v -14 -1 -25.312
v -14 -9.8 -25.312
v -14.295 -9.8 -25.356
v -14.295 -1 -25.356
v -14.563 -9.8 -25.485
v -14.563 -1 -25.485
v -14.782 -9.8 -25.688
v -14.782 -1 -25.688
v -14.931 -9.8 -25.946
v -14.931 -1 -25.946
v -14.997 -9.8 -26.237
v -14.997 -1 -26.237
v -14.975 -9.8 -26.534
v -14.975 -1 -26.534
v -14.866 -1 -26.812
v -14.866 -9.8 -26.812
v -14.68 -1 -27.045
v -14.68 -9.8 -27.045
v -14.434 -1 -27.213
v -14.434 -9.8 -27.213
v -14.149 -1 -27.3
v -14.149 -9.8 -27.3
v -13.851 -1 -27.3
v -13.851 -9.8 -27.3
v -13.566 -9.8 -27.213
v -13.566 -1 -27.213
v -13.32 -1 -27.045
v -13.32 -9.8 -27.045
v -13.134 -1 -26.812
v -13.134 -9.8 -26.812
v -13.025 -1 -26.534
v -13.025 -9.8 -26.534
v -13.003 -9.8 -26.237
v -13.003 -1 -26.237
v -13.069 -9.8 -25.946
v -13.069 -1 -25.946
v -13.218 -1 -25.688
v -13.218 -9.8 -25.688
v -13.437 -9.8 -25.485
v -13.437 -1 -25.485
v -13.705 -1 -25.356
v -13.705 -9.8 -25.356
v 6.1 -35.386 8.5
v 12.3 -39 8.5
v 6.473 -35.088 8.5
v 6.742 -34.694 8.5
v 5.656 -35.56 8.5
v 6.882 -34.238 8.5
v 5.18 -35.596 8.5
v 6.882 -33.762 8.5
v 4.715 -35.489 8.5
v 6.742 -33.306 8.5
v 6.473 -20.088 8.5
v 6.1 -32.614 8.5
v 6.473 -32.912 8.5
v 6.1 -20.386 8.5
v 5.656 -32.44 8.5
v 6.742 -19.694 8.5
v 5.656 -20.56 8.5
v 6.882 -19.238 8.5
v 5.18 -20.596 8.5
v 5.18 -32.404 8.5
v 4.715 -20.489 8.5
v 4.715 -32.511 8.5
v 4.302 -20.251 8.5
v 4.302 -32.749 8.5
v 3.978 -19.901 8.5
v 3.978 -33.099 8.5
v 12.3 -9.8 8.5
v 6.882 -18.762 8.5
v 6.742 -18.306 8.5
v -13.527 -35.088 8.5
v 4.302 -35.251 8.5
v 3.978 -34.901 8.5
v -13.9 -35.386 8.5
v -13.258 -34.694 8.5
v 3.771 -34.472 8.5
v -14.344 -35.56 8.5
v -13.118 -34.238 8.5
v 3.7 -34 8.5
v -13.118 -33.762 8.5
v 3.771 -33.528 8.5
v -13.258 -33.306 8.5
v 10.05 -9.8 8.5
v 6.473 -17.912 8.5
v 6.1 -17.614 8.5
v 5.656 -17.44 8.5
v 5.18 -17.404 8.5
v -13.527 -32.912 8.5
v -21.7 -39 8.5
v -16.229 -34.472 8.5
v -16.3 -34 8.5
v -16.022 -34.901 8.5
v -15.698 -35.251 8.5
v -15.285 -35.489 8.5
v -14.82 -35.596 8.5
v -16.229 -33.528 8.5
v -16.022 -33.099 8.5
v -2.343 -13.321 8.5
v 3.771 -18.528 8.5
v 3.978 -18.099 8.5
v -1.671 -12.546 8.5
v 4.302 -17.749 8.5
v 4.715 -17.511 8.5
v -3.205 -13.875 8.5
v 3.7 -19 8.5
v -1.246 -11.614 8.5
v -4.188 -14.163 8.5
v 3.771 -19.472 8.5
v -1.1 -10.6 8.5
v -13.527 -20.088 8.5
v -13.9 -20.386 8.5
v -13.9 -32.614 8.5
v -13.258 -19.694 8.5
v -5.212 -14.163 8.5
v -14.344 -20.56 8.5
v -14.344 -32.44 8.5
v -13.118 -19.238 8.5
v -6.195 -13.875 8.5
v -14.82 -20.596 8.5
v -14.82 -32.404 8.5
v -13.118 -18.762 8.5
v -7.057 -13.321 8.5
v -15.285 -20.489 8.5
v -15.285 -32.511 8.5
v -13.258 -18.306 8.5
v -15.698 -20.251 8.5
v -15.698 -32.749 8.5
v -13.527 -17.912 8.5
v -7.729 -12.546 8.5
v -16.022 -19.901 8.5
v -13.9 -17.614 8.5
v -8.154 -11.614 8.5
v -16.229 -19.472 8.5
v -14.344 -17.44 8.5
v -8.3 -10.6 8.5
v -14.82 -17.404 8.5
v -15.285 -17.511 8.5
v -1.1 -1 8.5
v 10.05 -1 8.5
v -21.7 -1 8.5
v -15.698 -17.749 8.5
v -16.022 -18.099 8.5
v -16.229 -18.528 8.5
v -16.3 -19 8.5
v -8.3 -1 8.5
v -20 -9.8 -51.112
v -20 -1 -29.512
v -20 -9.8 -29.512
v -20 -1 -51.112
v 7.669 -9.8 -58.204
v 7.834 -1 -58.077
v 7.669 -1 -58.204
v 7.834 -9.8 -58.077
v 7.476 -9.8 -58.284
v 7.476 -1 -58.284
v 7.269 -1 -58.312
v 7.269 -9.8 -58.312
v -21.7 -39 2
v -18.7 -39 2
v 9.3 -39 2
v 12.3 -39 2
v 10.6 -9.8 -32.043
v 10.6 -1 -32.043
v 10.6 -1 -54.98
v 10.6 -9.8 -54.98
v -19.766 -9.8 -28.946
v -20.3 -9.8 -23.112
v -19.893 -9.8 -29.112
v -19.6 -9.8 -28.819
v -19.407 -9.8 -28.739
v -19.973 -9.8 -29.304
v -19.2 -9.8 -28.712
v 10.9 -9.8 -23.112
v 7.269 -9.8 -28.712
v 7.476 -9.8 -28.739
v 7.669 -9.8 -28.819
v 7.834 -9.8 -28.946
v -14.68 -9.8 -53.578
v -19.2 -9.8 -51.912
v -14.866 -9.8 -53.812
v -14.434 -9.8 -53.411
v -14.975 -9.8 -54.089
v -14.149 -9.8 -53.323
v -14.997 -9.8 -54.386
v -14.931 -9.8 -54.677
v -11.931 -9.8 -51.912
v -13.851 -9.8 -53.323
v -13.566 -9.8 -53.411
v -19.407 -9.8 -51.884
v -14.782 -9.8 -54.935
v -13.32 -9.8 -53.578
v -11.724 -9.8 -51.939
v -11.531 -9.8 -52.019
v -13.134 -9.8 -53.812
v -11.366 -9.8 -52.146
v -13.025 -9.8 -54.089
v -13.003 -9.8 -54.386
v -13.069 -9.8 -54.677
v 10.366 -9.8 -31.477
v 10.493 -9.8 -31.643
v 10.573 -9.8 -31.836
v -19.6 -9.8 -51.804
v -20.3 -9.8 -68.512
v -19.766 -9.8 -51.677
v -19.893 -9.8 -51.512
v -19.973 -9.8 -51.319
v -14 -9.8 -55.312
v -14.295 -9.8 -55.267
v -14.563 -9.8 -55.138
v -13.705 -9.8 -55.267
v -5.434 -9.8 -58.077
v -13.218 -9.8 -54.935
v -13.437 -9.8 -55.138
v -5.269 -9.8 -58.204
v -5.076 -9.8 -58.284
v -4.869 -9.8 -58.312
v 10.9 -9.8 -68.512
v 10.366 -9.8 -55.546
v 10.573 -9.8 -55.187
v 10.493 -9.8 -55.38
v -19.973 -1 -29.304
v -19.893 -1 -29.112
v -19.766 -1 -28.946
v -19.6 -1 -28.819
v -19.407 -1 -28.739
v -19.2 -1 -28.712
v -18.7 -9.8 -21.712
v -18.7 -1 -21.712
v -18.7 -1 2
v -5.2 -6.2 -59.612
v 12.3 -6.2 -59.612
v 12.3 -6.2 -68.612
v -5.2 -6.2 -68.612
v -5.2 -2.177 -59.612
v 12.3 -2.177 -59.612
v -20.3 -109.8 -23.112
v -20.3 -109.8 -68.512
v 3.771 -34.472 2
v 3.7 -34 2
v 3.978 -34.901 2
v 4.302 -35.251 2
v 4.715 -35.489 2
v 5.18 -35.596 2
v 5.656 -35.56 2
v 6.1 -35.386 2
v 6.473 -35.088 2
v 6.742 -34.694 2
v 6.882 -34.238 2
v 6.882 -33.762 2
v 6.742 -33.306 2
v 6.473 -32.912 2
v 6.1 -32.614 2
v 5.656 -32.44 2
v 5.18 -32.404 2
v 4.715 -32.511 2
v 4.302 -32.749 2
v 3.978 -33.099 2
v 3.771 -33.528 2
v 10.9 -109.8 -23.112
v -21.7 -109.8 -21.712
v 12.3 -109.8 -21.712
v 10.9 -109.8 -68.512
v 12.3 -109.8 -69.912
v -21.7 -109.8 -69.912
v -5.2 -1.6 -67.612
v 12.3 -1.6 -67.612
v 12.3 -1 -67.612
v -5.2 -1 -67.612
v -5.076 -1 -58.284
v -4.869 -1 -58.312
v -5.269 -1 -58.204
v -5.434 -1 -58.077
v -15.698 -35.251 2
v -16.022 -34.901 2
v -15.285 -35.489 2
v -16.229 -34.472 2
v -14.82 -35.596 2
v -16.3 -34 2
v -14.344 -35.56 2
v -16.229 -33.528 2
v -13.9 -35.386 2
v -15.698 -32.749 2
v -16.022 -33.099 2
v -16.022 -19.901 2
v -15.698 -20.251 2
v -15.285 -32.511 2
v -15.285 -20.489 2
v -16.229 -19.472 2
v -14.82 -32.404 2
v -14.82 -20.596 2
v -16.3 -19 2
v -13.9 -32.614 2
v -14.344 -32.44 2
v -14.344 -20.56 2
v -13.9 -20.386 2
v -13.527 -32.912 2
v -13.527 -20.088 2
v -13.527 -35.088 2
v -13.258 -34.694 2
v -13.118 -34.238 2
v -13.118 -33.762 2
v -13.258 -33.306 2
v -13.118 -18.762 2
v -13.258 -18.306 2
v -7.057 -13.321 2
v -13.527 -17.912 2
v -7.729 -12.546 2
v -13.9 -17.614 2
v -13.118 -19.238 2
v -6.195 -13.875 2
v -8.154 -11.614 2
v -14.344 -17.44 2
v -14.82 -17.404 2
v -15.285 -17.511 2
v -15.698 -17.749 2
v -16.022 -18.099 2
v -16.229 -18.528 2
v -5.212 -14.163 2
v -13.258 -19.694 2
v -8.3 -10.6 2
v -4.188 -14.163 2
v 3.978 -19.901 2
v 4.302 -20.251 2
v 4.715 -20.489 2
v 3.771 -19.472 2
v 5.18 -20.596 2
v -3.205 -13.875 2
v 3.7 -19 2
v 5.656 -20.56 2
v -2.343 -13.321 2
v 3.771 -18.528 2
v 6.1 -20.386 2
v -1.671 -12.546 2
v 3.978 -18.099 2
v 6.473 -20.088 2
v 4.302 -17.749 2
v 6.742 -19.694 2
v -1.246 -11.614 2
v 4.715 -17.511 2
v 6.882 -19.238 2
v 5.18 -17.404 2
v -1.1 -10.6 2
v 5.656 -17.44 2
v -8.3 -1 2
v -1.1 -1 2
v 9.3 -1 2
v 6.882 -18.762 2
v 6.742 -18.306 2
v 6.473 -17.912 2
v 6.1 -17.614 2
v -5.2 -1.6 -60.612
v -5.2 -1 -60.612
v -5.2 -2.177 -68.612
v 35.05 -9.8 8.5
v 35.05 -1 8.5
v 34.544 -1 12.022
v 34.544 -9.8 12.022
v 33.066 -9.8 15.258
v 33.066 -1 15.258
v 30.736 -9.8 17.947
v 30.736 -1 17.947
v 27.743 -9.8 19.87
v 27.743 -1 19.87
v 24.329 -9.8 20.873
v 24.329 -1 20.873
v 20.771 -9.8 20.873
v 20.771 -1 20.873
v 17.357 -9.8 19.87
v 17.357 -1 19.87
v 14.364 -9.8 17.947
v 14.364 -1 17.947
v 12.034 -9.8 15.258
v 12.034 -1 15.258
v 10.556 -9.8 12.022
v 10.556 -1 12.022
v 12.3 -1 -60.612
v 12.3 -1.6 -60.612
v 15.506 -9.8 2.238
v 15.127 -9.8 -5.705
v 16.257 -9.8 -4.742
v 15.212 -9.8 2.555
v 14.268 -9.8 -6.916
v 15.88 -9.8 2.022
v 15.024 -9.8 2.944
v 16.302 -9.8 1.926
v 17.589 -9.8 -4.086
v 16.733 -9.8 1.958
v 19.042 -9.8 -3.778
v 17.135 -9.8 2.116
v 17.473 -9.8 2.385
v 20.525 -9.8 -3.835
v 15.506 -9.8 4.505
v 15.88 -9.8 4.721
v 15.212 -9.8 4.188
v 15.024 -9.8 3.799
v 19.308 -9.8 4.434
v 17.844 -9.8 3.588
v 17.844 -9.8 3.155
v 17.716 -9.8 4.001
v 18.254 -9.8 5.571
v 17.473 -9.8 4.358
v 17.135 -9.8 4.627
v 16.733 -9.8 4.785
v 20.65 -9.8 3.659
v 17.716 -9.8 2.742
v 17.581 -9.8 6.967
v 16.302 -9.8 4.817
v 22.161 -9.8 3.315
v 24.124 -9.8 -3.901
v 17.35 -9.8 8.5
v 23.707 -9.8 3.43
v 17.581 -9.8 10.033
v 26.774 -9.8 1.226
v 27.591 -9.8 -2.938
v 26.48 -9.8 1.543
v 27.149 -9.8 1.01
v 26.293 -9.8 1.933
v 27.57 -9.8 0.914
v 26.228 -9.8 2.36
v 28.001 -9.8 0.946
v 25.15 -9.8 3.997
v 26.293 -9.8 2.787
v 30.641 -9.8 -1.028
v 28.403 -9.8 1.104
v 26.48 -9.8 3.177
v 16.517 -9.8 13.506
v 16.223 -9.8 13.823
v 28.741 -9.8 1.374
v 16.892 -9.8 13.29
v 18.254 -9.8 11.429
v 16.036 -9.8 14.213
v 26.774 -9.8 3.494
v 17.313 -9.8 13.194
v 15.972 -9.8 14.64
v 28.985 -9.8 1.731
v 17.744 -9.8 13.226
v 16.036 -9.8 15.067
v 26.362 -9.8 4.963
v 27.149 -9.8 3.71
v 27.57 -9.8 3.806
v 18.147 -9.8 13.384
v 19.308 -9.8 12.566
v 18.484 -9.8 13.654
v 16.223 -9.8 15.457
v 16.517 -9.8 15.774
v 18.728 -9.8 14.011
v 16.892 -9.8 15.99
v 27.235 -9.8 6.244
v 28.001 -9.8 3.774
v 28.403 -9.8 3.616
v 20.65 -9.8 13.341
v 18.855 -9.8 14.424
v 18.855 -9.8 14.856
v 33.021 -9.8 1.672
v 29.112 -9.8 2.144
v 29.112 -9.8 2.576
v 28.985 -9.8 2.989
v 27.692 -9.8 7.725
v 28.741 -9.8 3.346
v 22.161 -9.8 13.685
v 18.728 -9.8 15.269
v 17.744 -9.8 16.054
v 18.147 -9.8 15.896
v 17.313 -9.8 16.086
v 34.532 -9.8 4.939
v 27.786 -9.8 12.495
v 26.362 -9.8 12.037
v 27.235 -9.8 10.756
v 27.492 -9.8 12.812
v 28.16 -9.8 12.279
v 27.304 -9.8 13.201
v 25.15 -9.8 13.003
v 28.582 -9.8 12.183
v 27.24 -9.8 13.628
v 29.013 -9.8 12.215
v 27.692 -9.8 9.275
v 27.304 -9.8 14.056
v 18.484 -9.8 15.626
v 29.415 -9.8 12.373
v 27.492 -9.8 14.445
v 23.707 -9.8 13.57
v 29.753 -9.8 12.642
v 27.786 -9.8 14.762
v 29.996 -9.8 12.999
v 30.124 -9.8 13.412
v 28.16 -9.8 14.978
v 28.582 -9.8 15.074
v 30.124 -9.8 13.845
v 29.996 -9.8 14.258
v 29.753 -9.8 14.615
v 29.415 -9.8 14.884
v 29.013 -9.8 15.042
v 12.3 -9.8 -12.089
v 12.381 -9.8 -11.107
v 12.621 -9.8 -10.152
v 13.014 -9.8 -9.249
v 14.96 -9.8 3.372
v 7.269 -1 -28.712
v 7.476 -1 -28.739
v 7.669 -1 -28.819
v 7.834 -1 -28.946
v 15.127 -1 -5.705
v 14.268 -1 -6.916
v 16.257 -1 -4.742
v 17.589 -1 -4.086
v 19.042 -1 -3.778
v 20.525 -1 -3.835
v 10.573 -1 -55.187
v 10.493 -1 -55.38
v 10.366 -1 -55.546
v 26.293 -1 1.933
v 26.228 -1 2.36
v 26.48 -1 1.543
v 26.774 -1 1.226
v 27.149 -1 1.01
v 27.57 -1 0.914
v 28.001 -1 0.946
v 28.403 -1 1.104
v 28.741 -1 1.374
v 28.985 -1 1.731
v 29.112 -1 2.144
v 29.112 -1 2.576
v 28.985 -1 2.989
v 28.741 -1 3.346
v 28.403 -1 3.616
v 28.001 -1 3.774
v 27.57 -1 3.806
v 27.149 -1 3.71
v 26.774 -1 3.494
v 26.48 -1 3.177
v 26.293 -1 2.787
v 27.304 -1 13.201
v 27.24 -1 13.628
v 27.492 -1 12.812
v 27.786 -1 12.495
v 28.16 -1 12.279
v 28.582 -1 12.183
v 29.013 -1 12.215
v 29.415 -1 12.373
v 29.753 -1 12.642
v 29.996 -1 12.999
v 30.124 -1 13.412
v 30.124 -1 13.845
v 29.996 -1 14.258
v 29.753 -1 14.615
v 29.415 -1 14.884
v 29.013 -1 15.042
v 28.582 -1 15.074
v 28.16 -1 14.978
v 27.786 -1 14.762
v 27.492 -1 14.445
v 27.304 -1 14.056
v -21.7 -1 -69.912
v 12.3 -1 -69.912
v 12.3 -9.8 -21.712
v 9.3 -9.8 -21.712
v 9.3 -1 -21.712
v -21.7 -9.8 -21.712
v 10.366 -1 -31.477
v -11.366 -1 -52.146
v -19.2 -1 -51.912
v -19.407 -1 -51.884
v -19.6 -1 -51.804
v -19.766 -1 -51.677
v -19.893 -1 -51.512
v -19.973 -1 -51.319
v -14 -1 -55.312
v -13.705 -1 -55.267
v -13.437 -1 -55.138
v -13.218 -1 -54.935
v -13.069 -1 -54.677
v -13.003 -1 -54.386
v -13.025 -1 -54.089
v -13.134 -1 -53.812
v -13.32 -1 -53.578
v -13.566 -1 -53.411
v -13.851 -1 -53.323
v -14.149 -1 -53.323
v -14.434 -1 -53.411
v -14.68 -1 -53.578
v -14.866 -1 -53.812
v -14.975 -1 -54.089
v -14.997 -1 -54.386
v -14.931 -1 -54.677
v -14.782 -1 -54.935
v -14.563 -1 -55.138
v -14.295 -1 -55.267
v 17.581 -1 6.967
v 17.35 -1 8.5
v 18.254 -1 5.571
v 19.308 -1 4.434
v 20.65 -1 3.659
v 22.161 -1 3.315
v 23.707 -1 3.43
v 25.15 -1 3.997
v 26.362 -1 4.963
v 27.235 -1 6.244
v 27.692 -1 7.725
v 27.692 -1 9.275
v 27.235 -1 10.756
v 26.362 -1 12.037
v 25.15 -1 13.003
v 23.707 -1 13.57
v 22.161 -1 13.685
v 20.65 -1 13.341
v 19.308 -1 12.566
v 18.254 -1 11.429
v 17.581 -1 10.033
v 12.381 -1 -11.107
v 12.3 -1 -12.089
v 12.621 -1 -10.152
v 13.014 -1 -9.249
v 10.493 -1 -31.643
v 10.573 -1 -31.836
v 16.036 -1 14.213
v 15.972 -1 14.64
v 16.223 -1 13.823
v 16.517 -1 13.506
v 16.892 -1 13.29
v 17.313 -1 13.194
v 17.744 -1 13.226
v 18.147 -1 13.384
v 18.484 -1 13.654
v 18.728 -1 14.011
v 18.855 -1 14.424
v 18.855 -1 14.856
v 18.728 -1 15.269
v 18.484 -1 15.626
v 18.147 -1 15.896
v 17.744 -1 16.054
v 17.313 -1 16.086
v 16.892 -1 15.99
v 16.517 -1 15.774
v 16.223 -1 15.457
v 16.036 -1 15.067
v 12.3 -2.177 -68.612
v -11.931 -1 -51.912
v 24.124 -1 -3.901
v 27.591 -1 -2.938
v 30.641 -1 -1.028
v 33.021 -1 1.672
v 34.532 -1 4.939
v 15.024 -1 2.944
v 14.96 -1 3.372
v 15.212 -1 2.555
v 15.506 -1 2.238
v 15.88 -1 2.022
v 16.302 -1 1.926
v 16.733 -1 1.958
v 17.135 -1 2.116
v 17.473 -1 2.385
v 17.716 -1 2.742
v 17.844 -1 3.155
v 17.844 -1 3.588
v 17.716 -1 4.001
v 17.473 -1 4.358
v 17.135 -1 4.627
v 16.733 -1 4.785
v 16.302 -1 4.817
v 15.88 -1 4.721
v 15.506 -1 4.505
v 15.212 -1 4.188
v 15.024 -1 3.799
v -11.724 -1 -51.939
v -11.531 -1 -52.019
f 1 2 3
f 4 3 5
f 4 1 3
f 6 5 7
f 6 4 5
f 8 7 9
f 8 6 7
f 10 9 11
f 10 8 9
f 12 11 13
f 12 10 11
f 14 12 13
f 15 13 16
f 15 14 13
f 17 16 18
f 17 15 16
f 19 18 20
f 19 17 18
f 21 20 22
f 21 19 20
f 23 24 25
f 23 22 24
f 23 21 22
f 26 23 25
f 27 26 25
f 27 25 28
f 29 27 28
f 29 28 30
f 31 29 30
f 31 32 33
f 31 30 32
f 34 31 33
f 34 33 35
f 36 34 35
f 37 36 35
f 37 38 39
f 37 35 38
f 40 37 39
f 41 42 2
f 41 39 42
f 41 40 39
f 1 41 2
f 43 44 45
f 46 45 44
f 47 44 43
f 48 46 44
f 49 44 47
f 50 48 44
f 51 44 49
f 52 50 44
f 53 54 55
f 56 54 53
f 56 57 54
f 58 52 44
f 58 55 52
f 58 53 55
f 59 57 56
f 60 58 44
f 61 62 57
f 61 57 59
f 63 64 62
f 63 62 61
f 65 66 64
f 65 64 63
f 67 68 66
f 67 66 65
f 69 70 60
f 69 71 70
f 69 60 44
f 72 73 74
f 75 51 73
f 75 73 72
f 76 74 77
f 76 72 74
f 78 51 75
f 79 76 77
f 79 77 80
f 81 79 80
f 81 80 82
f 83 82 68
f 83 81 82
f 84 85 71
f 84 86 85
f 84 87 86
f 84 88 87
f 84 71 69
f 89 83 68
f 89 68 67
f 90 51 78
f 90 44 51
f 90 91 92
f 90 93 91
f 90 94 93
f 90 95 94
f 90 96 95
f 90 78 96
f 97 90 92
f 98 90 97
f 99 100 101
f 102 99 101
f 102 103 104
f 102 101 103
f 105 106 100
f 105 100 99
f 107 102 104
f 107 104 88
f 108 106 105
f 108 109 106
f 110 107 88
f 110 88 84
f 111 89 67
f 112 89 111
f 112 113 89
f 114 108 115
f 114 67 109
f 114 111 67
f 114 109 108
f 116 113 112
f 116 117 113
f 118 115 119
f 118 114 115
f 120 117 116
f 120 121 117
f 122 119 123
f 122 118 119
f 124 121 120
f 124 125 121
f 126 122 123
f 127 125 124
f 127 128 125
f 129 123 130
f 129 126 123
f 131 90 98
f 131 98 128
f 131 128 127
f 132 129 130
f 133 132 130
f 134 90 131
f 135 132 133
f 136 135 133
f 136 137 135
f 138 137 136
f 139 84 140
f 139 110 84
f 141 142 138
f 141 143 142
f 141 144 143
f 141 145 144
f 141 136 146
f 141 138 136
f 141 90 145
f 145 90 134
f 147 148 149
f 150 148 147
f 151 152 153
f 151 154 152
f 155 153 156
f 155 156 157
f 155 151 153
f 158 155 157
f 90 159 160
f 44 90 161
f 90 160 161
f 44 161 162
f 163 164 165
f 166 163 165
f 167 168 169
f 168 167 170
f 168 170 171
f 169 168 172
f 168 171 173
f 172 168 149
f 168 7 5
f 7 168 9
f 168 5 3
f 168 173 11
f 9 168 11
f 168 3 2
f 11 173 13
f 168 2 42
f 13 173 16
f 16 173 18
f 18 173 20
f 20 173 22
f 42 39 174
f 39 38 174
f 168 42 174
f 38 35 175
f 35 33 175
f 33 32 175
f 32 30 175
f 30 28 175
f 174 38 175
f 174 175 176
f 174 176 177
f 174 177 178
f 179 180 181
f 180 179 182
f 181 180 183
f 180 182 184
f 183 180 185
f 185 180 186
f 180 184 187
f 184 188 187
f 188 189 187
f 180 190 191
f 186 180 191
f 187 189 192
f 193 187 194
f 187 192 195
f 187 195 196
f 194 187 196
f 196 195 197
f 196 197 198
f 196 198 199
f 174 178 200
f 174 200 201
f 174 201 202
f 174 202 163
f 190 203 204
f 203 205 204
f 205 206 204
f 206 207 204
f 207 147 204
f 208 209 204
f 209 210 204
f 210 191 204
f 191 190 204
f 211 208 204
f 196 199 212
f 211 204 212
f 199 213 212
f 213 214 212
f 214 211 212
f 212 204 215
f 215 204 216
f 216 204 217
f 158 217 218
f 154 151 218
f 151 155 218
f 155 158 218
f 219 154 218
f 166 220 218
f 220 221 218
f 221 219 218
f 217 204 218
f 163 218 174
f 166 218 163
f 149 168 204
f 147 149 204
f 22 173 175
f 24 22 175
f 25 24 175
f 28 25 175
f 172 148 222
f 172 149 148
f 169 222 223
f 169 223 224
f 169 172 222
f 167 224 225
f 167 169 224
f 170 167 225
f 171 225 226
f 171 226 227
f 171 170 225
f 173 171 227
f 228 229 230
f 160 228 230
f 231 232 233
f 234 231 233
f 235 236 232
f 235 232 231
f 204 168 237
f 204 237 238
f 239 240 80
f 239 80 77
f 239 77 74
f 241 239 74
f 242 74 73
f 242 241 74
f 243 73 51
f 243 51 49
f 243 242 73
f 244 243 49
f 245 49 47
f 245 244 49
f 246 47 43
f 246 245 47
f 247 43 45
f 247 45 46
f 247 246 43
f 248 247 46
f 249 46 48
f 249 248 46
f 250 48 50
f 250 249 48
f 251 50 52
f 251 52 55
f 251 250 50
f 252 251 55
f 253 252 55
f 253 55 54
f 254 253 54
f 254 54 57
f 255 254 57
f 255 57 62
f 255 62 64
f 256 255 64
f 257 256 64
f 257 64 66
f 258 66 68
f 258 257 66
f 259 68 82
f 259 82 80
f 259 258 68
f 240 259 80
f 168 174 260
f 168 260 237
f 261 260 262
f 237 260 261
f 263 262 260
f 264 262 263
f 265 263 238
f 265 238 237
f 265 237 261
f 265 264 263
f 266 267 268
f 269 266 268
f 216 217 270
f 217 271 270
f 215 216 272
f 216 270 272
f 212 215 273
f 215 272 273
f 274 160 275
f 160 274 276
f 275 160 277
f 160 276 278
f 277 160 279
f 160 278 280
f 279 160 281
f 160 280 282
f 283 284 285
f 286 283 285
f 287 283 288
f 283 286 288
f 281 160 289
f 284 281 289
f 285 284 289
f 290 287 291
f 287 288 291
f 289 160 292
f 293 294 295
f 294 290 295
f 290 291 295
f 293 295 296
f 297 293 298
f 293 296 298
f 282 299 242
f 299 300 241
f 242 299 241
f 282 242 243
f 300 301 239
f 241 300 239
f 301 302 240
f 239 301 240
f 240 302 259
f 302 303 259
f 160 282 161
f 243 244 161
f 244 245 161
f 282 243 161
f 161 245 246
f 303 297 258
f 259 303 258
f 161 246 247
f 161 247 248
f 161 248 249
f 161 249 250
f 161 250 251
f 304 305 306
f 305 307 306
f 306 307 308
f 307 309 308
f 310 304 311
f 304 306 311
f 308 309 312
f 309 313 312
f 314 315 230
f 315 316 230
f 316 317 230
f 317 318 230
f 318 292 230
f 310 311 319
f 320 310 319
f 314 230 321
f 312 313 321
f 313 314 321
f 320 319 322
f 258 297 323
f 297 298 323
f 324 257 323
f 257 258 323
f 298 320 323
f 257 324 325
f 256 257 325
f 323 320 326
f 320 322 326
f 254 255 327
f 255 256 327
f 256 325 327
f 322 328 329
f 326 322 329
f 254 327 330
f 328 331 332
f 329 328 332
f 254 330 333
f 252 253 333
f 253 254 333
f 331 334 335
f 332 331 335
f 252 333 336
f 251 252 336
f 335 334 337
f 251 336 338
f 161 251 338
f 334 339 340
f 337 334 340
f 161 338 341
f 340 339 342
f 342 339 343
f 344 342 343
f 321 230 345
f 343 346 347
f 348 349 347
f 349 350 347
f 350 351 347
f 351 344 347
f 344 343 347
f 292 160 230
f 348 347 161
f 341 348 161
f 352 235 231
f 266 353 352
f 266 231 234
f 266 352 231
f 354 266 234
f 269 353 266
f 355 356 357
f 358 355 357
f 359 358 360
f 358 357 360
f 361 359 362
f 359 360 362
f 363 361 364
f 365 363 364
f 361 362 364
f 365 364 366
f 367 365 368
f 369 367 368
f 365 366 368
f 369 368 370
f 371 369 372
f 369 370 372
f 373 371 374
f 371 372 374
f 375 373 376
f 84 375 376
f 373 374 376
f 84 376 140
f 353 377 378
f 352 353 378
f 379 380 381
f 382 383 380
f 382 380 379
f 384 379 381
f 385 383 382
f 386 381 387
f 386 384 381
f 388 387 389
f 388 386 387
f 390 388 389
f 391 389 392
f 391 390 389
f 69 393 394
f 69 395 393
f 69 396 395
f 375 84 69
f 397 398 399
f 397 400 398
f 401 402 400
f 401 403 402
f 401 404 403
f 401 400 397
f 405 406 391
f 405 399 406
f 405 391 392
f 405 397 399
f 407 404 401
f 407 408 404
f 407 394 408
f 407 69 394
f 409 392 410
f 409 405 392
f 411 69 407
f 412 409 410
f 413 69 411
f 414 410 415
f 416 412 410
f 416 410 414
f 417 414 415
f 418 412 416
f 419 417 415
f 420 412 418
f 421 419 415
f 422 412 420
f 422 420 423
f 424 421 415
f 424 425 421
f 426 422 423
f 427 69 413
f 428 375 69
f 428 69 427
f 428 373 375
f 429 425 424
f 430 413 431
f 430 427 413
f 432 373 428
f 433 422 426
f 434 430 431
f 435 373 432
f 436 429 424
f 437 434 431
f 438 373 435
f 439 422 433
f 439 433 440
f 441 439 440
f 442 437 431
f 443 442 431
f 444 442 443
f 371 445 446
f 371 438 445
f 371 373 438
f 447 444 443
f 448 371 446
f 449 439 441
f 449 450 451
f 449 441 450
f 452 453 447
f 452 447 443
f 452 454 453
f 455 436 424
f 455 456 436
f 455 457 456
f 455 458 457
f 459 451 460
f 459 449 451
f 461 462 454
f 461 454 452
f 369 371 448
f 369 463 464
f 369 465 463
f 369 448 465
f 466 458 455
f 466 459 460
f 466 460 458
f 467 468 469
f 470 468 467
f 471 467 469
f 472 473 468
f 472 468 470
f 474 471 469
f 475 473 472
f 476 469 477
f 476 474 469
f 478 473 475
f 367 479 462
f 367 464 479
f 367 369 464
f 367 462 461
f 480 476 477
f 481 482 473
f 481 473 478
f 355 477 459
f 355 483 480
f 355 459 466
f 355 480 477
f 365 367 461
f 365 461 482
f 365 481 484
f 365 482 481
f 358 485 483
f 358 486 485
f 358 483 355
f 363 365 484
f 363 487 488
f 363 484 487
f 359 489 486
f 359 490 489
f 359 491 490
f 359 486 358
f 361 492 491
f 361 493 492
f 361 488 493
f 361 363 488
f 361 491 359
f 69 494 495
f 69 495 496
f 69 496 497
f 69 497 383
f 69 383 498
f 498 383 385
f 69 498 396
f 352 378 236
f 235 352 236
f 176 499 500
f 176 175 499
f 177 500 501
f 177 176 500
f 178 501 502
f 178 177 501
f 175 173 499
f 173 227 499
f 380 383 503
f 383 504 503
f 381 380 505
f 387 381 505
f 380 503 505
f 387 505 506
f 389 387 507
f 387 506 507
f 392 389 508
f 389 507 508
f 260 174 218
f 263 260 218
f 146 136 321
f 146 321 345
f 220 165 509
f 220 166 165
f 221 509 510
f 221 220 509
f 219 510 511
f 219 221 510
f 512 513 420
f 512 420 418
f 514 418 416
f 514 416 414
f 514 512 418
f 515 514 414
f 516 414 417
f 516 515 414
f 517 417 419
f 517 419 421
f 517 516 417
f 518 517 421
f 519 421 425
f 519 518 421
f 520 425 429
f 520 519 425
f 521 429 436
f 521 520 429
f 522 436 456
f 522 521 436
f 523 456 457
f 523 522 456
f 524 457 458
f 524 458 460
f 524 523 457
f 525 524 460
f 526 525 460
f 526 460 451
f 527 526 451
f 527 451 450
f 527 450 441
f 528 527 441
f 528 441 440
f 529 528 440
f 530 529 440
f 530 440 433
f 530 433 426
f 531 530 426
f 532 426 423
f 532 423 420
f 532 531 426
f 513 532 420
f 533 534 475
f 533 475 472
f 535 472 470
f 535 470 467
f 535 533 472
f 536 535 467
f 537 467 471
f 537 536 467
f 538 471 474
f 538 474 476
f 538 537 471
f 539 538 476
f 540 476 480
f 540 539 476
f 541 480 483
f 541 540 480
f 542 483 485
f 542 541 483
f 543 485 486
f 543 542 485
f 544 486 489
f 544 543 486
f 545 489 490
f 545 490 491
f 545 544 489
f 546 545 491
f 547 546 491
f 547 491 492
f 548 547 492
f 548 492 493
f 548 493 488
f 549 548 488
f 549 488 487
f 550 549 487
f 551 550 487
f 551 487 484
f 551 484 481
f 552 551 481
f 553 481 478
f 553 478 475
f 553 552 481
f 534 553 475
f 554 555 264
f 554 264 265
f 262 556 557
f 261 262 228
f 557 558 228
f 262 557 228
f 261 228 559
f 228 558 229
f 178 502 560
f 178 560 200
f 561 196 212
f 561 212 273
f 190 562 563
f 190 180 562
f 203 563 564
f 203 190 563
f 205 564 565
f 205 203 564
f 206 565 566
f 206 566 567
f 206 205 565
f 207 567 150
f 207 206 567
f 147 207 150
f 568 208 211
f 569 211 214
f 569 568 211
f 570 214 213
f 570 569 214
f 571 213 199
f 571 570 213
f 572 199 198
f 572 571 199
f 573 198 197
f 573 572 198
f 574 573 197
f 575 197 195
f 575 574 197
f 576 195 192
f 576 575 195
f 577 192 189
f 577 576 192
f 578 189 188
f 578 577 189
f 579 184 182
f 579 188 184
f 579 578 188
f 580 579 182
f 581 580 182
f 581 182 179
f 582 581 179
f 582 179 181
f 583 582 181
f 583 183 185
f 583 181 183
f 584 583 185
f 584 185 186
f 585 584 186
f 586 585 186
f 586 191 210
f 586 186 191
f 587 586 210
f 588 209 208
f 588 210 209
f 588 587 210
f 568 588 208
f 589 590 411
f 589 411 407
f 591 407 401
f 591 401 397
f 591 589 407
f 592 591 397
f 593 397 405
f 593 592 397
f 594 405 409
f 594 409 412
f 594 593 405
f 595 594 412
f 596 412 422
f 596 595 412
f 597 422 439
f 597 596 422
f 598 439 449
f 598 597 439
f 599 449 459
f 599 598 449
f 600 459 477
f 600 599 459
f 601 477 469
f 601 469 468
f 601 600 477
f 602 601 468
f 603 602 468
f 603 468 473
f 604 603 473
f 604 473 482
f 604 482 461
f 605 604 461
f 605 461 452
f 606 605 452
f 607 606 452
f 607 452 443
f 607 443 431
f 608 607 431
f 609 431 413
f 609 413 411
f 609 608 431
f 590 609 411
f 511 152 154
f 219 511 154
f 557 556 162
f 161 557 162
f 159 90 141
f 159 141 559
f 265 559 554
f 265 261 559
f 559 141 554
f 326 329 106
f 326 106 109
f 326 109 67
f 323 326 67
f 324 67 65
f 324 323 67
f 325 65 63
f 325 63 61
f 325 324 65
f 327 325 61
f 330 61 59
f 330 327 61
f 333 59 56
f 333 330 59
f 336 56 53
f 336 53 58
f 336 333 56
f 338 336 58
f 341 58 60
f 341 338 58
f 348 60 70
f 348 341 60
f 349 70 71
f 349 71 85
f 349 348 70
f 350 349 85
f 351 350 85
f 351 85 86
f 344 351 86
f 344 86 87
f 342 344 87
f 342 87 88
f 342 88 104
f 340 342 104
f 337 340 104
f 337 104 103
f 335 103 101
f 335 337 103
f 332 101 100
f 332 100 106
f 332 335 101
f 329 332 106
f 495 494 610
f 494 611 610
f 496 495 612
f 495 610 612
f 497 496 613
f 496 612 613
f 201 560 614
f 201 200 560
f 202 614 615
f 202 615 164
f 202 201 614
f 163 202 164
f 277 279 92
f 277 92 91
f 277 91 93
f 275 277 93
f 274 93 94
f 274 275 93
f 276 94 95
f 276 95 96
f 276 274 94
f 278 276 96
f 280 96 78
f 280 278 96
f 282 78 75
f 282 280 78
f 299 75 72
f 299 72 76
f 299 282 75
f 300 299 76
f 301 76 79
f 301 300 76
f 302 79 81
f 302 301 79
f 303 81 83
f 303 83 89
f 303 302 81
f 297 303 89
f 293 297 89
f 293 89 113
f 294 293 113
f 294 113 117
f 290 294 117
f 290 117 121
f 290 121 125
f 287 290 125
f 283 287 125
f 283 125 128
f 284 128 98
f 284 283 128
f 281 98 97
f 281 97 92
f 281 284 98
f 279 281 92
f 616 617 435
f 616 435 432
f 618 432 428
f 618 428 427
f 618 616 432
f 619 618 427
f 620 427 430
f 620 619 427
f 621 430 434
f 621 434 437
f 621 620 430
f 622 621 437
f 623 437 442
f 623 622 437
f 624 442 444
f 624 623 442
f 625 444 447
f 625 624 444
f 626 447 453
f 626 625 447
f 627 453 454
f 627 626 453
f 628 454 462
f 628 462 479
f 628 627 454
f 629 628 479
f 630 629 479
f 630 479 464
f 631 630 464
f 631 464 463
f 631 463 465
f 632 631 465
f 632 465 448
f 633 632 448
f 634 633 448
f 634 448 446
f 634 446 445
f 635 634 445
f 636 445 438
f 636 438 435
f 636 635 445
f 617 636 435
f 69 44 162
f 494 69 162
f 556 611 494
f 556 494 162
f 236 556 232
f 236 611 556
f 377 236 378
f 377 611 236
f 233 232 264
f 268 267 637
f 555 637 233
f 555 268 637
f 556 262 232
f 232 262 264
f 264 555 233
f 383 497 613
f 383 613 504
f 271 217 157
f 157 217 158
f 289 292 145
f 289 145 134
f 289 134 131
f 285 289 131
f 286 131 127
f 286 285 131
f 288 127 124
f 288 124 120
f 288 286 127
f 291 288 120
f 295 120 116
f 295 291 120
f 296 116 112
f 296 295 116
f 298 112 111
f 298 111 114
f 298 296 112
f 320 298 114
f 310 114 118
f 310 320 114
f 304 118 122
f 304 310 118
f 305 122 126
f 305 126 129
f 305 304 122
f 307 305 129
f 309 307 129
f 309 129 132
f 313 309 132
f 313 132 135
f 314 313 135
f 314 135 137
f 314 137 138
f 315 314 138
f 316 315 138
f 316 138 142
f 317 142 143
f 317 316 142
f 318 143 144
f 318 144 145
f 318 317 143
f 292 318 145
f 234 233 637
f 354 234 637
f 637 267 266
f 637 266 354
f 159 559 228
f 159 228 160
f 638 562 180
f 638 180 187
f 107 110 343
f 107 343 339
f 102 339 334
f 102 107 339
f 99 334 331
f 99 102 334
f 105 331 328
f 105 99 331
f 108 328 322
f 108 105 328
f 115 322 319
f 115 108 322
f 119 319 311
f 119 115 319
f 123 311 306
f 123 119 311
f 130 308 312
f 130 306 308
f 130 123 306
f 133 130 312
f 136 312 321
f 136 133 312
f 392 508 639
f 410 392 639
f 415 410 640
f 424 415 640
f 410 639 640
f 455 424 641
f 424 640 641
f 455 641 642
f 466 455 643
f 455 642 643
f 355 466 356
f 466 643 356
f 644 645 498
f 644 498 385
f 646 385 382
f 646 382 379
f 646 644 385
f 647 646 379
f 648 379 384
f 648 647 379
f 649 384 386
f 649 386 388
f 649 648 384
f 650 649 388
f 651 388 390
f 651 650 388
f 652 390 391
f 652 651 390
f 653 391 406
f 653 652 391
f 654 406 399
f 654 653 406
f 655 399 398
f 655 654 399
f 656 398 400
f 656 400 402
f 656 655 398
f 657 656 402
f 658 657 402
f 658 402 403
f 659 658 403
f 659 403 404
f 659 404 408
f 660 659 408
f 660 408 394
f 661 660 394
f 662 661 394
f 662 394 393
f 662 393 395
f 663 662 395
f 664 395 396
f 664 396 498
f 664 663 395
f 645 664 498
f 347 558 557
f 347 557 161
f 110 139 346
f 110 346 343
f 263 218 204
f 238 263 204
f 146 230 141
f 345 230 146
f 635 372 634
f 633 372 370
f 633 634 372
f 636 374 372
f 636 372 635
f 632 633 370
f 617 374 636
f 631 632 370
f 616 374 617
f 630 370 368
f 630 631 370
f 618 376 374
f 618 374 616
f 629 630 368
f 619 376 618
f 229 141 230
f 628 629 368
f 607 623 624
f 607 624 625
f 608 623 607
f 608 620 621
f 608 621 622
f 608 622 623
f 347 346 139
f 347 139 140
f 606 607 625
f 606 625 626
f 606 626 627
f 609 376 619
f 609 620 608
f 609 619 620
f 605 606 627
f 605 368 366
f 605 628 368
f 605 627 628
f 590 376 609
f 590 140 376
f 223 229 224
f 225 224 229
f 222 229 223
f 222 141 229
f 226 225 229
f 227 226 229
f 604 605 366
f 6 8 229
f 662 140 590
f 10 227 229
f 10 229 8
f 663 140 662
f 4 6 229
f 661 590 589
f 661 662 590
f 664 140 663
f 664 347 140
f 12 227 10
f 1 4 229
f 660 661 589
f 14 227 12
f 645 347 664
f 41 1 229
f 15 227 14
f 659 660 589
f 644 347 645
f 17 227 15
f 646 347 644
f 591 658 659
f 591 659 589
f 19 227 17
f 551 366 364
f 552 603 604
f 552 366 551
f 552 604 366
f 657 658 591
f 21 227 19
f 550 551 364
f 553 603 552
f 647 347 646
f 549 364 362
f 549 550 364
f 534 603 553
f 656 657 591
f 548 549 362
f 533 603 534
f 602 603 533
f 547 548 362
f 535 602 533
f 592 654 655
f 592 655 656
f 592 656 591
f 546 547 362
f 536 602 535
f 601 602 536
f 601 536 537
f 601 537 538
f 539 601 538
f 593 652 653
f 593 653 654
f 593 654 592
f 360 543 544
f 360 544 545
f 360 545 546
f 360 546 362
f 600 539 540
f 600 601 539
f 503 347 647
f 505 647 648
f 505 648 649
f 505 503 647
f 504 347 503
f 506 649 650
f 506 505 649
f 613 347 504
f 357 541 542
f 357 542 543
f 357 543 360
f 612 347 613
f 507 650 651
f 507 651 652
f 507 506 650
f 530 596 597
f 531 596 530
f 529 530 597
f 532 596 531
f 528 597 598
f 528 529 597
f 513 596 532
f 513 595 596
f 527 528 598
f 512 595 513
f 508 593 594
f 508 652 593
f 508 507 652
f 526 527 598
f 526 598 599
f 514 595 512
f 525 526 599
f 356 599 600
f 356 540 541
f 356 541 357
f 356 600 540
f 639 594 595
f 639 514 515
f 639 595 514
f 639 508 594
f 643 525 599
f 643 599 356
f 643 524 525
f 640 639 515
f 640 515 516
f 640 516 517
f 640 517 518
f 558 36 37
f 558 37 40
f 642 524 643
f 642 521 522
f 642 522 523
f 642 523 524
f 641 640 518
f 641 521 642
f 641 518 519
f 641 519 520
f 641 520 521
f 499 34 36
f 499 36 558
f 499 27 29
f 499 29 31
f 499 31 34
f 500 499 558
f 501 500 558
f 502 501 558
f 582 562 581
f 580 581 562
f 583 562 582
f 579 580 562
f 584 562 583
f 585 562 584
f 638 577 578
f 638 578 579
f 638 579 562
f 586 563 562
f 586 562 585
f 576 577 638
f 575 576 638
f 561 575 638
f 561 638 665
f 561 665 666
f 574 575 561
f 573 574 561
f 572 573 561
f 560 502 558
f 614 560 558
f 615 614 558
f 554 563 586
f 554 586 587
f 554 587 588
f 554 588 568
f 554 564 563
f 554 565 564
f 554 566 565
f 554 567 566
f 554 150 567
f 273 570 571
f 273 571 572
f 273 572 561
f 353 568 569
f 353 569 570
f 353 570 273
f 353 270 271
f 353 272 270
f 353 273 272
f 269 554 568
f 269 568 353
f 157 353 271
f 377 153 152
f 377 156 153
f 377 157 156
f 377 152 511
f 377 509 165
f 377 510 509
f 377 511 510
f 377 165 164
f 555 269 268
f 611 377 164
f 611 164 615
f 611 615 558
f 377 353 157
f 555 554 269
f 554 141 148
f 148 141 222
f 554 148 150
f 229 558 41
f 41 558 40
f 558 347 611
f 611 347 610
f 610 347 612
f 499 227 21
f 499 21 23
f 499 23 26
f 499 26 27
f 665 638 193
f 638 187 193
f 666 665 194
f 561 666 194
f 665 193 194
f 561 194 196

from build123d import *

# Parameters (mm, degrees)
BOSS_EXTRUDE1_START      = -1
SKETCH1_W                = 1.7
SKETCH1_H                = 89.2
BOSS_EXTRUDE1_DEPTH      = 8.8
SKETCH4_W                = 33.7
SKETCH4_H                = 11.6
BOSS_EXTRUDE3_DEPTH      = 8.8
SERVO_HOLDER_DEPTH       = 1
SERVO_HOLDER_DEPTH_BACK  = 8.8
SKETCH3_W                = 14
SKETCH3_H                = 7
SKETCH3_R                = 1
SKETCH37_W               = 20
SKETCH37_H               = 7
BOSS_EXTRUDE19_DEPTH     = 9.8
CUT_EXTRUDE10_DEPTH      = 93.434679639
CUT_EXTRUDE10_DEPTH_BACK = 93.434679639
SKETCH29_W               = 34.409909993
SKETCH29_H               = 6.377389624
BOSS_EXTRUDE13_START     = 2
SKETCH30_W               = 34
SKETCH30_H               = 38
SKETCH30_R               = 1.6
BOSS_EXTRUDE13_DEPTH     = 6.5
SKETCH41_W               = 17.288461538
SKETCH41_H               = 8.8
CUT_EXTRUDE14_DEPTH      = 15
BOSS_EXTRUDE14_START     = -38
SKETCH32_R               = 1.45
SKETCH32_R_2             = 5.2
BOSS_EXTRUDE14_DEPTH     = 8.8
BOSS_EXTRUDE16_DEPTH     = 3
BOSS_EXTRUDE17_DEPTH     = 3
BOSS_EXTRUDE18_DEPTH     = 8.8
SKETCH39_W               = 1.7
SKETCH39_H               = 41.2
BOSS_EXTRUDE20_DEPTH     = 8.8
CUT_EXTRUDE13_DEPTH      = 17.5
CHAMFER2_SIZE            = 0.6
CHAMFER2_SIZE_2          = 1.039230485
CHAMFER3_SIZE            = 3
FILLET10_R               = 6
CUT_EXTRUDE15_DEPTH      = 10
CHAMFER4_SIZE            = 2.5
CUT_EXTRUDE16_DEPTH      = 10
FILLET11_R               = 0.8
SKETCH44_W               = 34
SKETCH44_H               = 48.2
SKETCH44_W_2             = 31.2
SKETCH44_H_2             = 45.4
BOSS_EXTRUDE21_DEPTH     = 100


with BuildPart() as part:
    # Sketch1 → Boss-Extrude1 (new body)
    with BuildSketch(Plane(origin=(0, 0, 0), x_dir=(1, 0, 0), z_dir=(0, 1, 0)).offset(BOSS_EXTRUDE1_START)):
        with Locations((-20.85, 25.311538462)):
            Rectangle(SKETCH1_W, SKETCH1_H)
    extrude(amount=-BOSS_EXTRUDE1_DEPTH)

    # Sketch4 → Boss-Extrude3 (add)
    with BuildSketch(Plane.XZ.offset(9.8)):
        with Locations((-4.85, -64.111538462)):
            Rectangle(SKETCH4_W, SKETCH4_H)
    extrude(amount=-BOSS_EXTRUDE3_DEPTH)

    # Sketch3 → Servo Holder (add, two sides: drawn at the far end of the back side and taken through both)
    # profile 1 of 2: a face of its own
    with BuildSketch(Plane.XZ.offset(9.8).offset(-SERVO_HOLDER_DEPTH_BACK)):
        with Locations((-14.7, -55.411538462)):
            Rectangle(SKETCH3_W, SKETCH3_H)
        with Locations(Location((-14, -54.311538462, 0), (0, 0, 270))):
            Circle(SKETCH3_R, mode=Mode.SUBTRACT)
    # profile 2 of 2: a face of its own
    with BuildSketch(Plane.XZ.offset(9.8).offset(-SERVO_HOLDER_DEPTH_BACK)):
        with Locations((-14.7, -25.211538462)):
            Rectangle(SKETCH3_W, SKETCH3_H)
        with Locations(Location((-14, -26.311538462, 0), (0, 0, 90))):
            Circle(SKETCH3_R, mode=Mode.SUBTRACT)
    extrude(amount=SERVO_HOLDER_DEPTH + SERVO_HOLDER_DEPTH_BACK)

    # Sketch37 → Boss-Extrude19 (add)
    with BuildSketch(Plane(origin=(0, -1, 0), x_dir=(1, 0, 0), z_dir=(0, 1, 0))):
        with Locations((2.3, 25.211538462)):
            Rectangle(SKETCH37_W, SKETCH37_H)
    extrude(amount=-BOSS_EXTRUDE19_DEPTH)

    # Sketch29 → Cut-Extrude10 (cut, two sides: drawn at the far end of the back side and taken through both)
    with BuildSketch(Plane(origin=(0, 0, -69.911538462), x_dir=(-1, 0, 0), z_dir=(0, 0, -1)).offset(-CUT_EXTRUDE10_DEPTH_BACK)):
        with Locations((4.495045004, -12.988694812)):
            Rectangle(SKETCH29_W, SKETCH29_H)
    extrude(amount=CUT_EXTRUDE10_DEPTH + CUT_EXTRUDE10_DEPTH_BACK, mode=Mode.SUBTRACT)


with BuildPart() as body_2:
    # Sketch30 → Boss-Extrude13 (new body)
    with BuildSketch(Plane.XY.offset(BOSS_EXTRUDE13_START)):
        with Locations((-4.7, -20)):
            Rectangle(SKETCH30_W, SKETCH30_H)
        with Locations(Location((5.3, -34, 0), (0, 0, 180))):
            Circle(SKETCH30_R, mode=Mode.SUBTRACT)
        with Locations(Location((5.3, -19, 0), (0, 0, 180))):
            Circle(SKETCH30_R, mode=Mode.SUBTRACT)
        with Locations(Location((-14.7, -34, 0), (0, 0, 180))):
            Circle(SKETCH30_R, mode=Mode.SUBTRACT)
        with Locations(Location((-14.7, -19, 0), (0, 0, 180))):
            Circle(SKETCH30_R, mode=Mode.SUBTRACT)
    extrude(amount=BOSS_EXTRUDE13_DEPTH)


with BuildPart() as cut_extrude14_tool:
    # Sketch41 → Cut-Extrude14 (new body)
    with BuildSketch(Plane(origin=(-20, 0, 0), x_dir=(0, 0, -1), z_dir=(1, 0, 0))):
        with Locations((-10.644230769, -5.4)):
            Rectangle(SKETCH41_W, SKETCH41_H)
    extrude(amount=-CUT_EXTRUDE14_DEPTH)


with BuildPart() as part_1:
    add(part.part)

    # Cut-Extrude14: cut by cut_extrude14_tool
    add(cut_extrude14_tool.part, mode=Mode.SUBTRACT)



with BuildPart() as body_2_1:
    add(body_2.part)

    # Cut-Extrude14: cut by cut_extrude14_tool
    add(cut_extrude14_tool.part, mode=Mode.SUBTRACT)

    # Sketch32 → Boss-Extrude14 (add)
    with BuildSketch(Plane.XZ.offset(39).offset(BOSS_EXTRUDE14_START)):
        with BuildLine():
            ThreePointArc((11.872921748, 2), (25.925390485, -3.535644523), (35.05, 8.5))
            ThreePointArc((35.05, 8.5), (22.55, 21), (10.05, 8.5))
            Line((10.05, 8.5), (12.3, 8.5))
            Line((12.3, 8.5), (12.3, 2))
            Line((12.3, 2), (11.872921748, 2))
        make_face()
        with Locations(Location((16.410078628, 3.371514303, 0), (0, 0, 180))):
            Circle(SKETCH32_R, mode=Mode.SUBTRACT)
        with Locations(Location((27.678485697, 2.360078628, 0), (0, 0, 180))):
            Circle(SKETCH32_R, mode=Mode.SUBTRACT)
        with Locations(Location((17.421514303, 14.639921372, 0), (0, 0, 180))):
            Circle(SKETCH32_R, mode=Mode.SUBTRACT)
        with Locations(Location((22.55, 8.5, 0), (0, 0, 180))):
            Circle(SKETCH32_R_2, mode=Mode.SUBTRACT)
        with Locations(Location((28.689921372, 13.628485697, 0), (0, 0, 180))):
            Circle(SKETCH32_R, mode=Mode.SUBTRACT)
    extrude(amount=BOSS_EXTRUDE14_DEPTH)


with BuildPart() as part_2:
    add(part_1.part)

    add(body_2_1.part)  # Boss-Extrude16 merges body 2
    # Sketch34 → Boss-Extrude16 (add)
    with BuildSketch(Plane.ZY.offset(21.7)):
        Polygon((-21.711538462, -1), (-21.711538462, -9.8), (2, -39), (8.5, -39), (8.5, -1), align=None)
    extrude(amount=-BOSS_EXTRUDE16_DEPTH)

    # Sketch35 → Boss-Extrude17 (add)
    with BuildSketch(Plane(origin=(12.3, 0, 0), x_dir=(0, 0, -1), z_dir=(1, 0, 0))):
        Polygon((-2, -1), (21.711538462, -1), (21.711538462, -9.8), (-2, -39), (-8.5, -39), (-8.5, -9.8), (-8.5, -1), align=None)
    extrude(amount=-BOSS_EXTRUDE17_DEPTH)

    # Sketch36 → Boss-Extrude18 (add)
    with BuildSketch(Plane.XZ.offset(9.8)):
        Polygon((12.3, -10.579162849), (16.63422252, -2.511520186), (12.3, 1.345455989), align=None)
    extrude(amount=-BOSS_EXTRUDE18_DEPTH)

    # Sketch39 → Boss-Extrude20 (add)
    with BuildSketch(Plane(origin=(0, -1, 0), x_dir=(1, 0, 0), z_dir=(0, 1, 0))):
        with Locations((11.45, 49.311538462)):
            Rectangle(SKETCH39_W, SKETCH39_H)
    extrude(amount=-BOSS_EXTRUDE20_DEPTH)

    # Sketch40 → Cut-Extrude13 (cut)
    with BuildSketch(Plane(origin=(12.3, 0, 0), x_dir=(0, 0, -1), z_dir=(1, 0, 0))):
        Polygon((64.111538462, -1), (60.611538462, -1), (60.611538462, -2.2), (59.611538462, -2.2), (59.611538462, -6.2), (64.111538462, -6.2), align=None)
        Polygon((67.611538462, -1), (64.111538462, -1), (64.111538462, -6.2), (68.611538462, -6.2), (68.611538462, -2.2), (67.611538462, -2.2), align=None)
    extrude(amount=-CUT_EXTRUDE13_DEPTH, mode=Mode.SUBTRACT)

    # Chamfer2
    # the kernel refuses this chamfer: 1.039230485, 0.6 mm, written as the material it takes off along each edge
    with BuildSketch(Plane(origin=(14.988578382, -2.2, -67.611538462), x_dir=(0, 0.9983227437537925, 0.05789386240267319), z_dir=(-1, 0, 0))) as chamfer2_piece_1_section:
        Polygon((CHAMFER2_SIZE * 0.998322743754, CHAMFER2_SIZE * 0.0578938624027), (-CHAMFER2_SIZE_2 * 0.0578938623771, CHAMFER2_SIZE_2 * 0.998322743313), (0, 0), align=None)
    chamfer2_piece_1 = extrude(amount=20.188578382, mode=Mode.PRIVATE)
    chamfer2_piece_1 = split(chamfer2_piece_1, bisect_by=Plane(origin=(4.894289191, -2.005782009, -68.611538462), z_dir=(0, 0, 1)), keep=Keep.TOP, mode=Mode.PRIVATE)
    add(chamfer2_piece_1, mode=Mode.SUBTRACT)
    with BuildSketch(Plane(origin=(14.988578382, -2.2, -60.611538462), x_dir=(0, 0.9983227437537925, -0.05789386240267317), z_dir=(-1, 0, 0))) as chamfer2_piece_2_section:
        Polygon((CHAMFER2_SIZE * 0.998322743754, -CHAMFER2_SIZE * 0.0578938624027), (-CHAMFER2_SIZE_2 * 0.0578938623771, -CHAMFER2_SIZE_2 * 0.998322743313), (0, 0), align=None)
    chamfer2_piece_2 = extrude(amount=20.188578382, mode=Mode.PRIVATE)
    chamfer2_piece_2 = split(chamfer2_piece_2, bisect_by=Plane(origin=(4.894289191, -2.005782009, -59.611538462), z_dir=(0, 0, -1)), keep=Keep.TOP, mode=Mode.PRIVATE)
    add(chamfer2_piece_2, mode=Mode.SUBTRACT)

    # Chamfer3
    chamfer3_edges = [part_2.edges().sort_by_distance(p)[0] for p in [
        (10.6, -5.4, -58.311538462),
        (10.6, -5.4, -28.711538462),
    ]]
    chamfer(chamfer3_edges, length=CHAMFER3_SIZE)

    # Fillet10
    fillet10_edges = [part_2.edges().sort_by_distance(p)[0] for p in [
        (16.63422252, -5.4, -2.511520186),
        (12.3, -5.4, -10.579162849),
    ]]
    fillet(fillet10_edges, radius=FILLET10_R)

    # Sketch42 → Cut-Extrude15 (cut)
    with BuildSketch(Plane.XY.offset(8.5)):
        with BuildLine():
            Line((-1.1, -1), (-1.1, -10.6))
            ThreePointArc((-1.1, -10.6), (-4.7, -14.2), (-8.3, -10.6))
            Line((-8.3, -10.6), (-8.3, -1))
            Line((-8.3, -1), (-1.1, -1))
        make_face()
    extrude(amount=-CUT_EXTRUDE15_DEPTH, mode=Mode.SUBTRACT)

    # Chamfer4
    chamfer4_edges = [part_2.edges().sort_by_distance(p)[0] for p in [
        (-7.7, -5.4, -58.311538462),
    ]]
    chamfer(chamfer4_edges, length=CHAMFER4_SIZE)

    # Sketch43 → Cut-Extrude16 (cut)
    with BuildSketch(Plane(origin=(0, -1, 0), x_dir=(1, 0, 0), z_dir=(0, 1, 0))):
        Polygon((-5.2, 58.311538462), (-11.6, 51.911538462), (-5.2, 51.911538462), align=None)
    extrude(amount=-CUT_EXTRUDE16_DEPTH, mode=Mode.SUBTRACT)

    # Fillet11
    fillet11_edges = [part_2.edges().sort_by_distance(p)[0] for p in [
        (-20, -5.4, -28.711538462),
        (-20, -5.4, -51.911538462),
        (10.6, -5.4, -55.311538462),
        (10.6, -5.4, -31.711538462),
        (7.6, -5.4, -28.711538462),
        (7.6, -5.4, -58.311538462),
        (-5.2, -5.4, -58.311538462),
        (-11.6, -5.4, -51.911538462),
    ]]
    fillet(fillet11_edges, radius=FILLET11_R)

    # Sketch44 → Boss-Extrude21 (add)
    with BuildSketch(Plane(origin=(0, -9.8, 0), x_dir=(-1, 0, 0), z_dir=(0, -1, 0))):
        with Locations((4.7, 45.811538462)):
            Rectangle(SKETCH44_W, SKETCH44_H)
        with Locations((4.7, 45.811538462)):
            Rectangle(SKETCH44_W_2, SKETCH44_H_2, mode=Mode.SUBTRACT)
    extrude(amount=BOSS_EXTRUDE21_DEPTH)


solid = part_2.part
